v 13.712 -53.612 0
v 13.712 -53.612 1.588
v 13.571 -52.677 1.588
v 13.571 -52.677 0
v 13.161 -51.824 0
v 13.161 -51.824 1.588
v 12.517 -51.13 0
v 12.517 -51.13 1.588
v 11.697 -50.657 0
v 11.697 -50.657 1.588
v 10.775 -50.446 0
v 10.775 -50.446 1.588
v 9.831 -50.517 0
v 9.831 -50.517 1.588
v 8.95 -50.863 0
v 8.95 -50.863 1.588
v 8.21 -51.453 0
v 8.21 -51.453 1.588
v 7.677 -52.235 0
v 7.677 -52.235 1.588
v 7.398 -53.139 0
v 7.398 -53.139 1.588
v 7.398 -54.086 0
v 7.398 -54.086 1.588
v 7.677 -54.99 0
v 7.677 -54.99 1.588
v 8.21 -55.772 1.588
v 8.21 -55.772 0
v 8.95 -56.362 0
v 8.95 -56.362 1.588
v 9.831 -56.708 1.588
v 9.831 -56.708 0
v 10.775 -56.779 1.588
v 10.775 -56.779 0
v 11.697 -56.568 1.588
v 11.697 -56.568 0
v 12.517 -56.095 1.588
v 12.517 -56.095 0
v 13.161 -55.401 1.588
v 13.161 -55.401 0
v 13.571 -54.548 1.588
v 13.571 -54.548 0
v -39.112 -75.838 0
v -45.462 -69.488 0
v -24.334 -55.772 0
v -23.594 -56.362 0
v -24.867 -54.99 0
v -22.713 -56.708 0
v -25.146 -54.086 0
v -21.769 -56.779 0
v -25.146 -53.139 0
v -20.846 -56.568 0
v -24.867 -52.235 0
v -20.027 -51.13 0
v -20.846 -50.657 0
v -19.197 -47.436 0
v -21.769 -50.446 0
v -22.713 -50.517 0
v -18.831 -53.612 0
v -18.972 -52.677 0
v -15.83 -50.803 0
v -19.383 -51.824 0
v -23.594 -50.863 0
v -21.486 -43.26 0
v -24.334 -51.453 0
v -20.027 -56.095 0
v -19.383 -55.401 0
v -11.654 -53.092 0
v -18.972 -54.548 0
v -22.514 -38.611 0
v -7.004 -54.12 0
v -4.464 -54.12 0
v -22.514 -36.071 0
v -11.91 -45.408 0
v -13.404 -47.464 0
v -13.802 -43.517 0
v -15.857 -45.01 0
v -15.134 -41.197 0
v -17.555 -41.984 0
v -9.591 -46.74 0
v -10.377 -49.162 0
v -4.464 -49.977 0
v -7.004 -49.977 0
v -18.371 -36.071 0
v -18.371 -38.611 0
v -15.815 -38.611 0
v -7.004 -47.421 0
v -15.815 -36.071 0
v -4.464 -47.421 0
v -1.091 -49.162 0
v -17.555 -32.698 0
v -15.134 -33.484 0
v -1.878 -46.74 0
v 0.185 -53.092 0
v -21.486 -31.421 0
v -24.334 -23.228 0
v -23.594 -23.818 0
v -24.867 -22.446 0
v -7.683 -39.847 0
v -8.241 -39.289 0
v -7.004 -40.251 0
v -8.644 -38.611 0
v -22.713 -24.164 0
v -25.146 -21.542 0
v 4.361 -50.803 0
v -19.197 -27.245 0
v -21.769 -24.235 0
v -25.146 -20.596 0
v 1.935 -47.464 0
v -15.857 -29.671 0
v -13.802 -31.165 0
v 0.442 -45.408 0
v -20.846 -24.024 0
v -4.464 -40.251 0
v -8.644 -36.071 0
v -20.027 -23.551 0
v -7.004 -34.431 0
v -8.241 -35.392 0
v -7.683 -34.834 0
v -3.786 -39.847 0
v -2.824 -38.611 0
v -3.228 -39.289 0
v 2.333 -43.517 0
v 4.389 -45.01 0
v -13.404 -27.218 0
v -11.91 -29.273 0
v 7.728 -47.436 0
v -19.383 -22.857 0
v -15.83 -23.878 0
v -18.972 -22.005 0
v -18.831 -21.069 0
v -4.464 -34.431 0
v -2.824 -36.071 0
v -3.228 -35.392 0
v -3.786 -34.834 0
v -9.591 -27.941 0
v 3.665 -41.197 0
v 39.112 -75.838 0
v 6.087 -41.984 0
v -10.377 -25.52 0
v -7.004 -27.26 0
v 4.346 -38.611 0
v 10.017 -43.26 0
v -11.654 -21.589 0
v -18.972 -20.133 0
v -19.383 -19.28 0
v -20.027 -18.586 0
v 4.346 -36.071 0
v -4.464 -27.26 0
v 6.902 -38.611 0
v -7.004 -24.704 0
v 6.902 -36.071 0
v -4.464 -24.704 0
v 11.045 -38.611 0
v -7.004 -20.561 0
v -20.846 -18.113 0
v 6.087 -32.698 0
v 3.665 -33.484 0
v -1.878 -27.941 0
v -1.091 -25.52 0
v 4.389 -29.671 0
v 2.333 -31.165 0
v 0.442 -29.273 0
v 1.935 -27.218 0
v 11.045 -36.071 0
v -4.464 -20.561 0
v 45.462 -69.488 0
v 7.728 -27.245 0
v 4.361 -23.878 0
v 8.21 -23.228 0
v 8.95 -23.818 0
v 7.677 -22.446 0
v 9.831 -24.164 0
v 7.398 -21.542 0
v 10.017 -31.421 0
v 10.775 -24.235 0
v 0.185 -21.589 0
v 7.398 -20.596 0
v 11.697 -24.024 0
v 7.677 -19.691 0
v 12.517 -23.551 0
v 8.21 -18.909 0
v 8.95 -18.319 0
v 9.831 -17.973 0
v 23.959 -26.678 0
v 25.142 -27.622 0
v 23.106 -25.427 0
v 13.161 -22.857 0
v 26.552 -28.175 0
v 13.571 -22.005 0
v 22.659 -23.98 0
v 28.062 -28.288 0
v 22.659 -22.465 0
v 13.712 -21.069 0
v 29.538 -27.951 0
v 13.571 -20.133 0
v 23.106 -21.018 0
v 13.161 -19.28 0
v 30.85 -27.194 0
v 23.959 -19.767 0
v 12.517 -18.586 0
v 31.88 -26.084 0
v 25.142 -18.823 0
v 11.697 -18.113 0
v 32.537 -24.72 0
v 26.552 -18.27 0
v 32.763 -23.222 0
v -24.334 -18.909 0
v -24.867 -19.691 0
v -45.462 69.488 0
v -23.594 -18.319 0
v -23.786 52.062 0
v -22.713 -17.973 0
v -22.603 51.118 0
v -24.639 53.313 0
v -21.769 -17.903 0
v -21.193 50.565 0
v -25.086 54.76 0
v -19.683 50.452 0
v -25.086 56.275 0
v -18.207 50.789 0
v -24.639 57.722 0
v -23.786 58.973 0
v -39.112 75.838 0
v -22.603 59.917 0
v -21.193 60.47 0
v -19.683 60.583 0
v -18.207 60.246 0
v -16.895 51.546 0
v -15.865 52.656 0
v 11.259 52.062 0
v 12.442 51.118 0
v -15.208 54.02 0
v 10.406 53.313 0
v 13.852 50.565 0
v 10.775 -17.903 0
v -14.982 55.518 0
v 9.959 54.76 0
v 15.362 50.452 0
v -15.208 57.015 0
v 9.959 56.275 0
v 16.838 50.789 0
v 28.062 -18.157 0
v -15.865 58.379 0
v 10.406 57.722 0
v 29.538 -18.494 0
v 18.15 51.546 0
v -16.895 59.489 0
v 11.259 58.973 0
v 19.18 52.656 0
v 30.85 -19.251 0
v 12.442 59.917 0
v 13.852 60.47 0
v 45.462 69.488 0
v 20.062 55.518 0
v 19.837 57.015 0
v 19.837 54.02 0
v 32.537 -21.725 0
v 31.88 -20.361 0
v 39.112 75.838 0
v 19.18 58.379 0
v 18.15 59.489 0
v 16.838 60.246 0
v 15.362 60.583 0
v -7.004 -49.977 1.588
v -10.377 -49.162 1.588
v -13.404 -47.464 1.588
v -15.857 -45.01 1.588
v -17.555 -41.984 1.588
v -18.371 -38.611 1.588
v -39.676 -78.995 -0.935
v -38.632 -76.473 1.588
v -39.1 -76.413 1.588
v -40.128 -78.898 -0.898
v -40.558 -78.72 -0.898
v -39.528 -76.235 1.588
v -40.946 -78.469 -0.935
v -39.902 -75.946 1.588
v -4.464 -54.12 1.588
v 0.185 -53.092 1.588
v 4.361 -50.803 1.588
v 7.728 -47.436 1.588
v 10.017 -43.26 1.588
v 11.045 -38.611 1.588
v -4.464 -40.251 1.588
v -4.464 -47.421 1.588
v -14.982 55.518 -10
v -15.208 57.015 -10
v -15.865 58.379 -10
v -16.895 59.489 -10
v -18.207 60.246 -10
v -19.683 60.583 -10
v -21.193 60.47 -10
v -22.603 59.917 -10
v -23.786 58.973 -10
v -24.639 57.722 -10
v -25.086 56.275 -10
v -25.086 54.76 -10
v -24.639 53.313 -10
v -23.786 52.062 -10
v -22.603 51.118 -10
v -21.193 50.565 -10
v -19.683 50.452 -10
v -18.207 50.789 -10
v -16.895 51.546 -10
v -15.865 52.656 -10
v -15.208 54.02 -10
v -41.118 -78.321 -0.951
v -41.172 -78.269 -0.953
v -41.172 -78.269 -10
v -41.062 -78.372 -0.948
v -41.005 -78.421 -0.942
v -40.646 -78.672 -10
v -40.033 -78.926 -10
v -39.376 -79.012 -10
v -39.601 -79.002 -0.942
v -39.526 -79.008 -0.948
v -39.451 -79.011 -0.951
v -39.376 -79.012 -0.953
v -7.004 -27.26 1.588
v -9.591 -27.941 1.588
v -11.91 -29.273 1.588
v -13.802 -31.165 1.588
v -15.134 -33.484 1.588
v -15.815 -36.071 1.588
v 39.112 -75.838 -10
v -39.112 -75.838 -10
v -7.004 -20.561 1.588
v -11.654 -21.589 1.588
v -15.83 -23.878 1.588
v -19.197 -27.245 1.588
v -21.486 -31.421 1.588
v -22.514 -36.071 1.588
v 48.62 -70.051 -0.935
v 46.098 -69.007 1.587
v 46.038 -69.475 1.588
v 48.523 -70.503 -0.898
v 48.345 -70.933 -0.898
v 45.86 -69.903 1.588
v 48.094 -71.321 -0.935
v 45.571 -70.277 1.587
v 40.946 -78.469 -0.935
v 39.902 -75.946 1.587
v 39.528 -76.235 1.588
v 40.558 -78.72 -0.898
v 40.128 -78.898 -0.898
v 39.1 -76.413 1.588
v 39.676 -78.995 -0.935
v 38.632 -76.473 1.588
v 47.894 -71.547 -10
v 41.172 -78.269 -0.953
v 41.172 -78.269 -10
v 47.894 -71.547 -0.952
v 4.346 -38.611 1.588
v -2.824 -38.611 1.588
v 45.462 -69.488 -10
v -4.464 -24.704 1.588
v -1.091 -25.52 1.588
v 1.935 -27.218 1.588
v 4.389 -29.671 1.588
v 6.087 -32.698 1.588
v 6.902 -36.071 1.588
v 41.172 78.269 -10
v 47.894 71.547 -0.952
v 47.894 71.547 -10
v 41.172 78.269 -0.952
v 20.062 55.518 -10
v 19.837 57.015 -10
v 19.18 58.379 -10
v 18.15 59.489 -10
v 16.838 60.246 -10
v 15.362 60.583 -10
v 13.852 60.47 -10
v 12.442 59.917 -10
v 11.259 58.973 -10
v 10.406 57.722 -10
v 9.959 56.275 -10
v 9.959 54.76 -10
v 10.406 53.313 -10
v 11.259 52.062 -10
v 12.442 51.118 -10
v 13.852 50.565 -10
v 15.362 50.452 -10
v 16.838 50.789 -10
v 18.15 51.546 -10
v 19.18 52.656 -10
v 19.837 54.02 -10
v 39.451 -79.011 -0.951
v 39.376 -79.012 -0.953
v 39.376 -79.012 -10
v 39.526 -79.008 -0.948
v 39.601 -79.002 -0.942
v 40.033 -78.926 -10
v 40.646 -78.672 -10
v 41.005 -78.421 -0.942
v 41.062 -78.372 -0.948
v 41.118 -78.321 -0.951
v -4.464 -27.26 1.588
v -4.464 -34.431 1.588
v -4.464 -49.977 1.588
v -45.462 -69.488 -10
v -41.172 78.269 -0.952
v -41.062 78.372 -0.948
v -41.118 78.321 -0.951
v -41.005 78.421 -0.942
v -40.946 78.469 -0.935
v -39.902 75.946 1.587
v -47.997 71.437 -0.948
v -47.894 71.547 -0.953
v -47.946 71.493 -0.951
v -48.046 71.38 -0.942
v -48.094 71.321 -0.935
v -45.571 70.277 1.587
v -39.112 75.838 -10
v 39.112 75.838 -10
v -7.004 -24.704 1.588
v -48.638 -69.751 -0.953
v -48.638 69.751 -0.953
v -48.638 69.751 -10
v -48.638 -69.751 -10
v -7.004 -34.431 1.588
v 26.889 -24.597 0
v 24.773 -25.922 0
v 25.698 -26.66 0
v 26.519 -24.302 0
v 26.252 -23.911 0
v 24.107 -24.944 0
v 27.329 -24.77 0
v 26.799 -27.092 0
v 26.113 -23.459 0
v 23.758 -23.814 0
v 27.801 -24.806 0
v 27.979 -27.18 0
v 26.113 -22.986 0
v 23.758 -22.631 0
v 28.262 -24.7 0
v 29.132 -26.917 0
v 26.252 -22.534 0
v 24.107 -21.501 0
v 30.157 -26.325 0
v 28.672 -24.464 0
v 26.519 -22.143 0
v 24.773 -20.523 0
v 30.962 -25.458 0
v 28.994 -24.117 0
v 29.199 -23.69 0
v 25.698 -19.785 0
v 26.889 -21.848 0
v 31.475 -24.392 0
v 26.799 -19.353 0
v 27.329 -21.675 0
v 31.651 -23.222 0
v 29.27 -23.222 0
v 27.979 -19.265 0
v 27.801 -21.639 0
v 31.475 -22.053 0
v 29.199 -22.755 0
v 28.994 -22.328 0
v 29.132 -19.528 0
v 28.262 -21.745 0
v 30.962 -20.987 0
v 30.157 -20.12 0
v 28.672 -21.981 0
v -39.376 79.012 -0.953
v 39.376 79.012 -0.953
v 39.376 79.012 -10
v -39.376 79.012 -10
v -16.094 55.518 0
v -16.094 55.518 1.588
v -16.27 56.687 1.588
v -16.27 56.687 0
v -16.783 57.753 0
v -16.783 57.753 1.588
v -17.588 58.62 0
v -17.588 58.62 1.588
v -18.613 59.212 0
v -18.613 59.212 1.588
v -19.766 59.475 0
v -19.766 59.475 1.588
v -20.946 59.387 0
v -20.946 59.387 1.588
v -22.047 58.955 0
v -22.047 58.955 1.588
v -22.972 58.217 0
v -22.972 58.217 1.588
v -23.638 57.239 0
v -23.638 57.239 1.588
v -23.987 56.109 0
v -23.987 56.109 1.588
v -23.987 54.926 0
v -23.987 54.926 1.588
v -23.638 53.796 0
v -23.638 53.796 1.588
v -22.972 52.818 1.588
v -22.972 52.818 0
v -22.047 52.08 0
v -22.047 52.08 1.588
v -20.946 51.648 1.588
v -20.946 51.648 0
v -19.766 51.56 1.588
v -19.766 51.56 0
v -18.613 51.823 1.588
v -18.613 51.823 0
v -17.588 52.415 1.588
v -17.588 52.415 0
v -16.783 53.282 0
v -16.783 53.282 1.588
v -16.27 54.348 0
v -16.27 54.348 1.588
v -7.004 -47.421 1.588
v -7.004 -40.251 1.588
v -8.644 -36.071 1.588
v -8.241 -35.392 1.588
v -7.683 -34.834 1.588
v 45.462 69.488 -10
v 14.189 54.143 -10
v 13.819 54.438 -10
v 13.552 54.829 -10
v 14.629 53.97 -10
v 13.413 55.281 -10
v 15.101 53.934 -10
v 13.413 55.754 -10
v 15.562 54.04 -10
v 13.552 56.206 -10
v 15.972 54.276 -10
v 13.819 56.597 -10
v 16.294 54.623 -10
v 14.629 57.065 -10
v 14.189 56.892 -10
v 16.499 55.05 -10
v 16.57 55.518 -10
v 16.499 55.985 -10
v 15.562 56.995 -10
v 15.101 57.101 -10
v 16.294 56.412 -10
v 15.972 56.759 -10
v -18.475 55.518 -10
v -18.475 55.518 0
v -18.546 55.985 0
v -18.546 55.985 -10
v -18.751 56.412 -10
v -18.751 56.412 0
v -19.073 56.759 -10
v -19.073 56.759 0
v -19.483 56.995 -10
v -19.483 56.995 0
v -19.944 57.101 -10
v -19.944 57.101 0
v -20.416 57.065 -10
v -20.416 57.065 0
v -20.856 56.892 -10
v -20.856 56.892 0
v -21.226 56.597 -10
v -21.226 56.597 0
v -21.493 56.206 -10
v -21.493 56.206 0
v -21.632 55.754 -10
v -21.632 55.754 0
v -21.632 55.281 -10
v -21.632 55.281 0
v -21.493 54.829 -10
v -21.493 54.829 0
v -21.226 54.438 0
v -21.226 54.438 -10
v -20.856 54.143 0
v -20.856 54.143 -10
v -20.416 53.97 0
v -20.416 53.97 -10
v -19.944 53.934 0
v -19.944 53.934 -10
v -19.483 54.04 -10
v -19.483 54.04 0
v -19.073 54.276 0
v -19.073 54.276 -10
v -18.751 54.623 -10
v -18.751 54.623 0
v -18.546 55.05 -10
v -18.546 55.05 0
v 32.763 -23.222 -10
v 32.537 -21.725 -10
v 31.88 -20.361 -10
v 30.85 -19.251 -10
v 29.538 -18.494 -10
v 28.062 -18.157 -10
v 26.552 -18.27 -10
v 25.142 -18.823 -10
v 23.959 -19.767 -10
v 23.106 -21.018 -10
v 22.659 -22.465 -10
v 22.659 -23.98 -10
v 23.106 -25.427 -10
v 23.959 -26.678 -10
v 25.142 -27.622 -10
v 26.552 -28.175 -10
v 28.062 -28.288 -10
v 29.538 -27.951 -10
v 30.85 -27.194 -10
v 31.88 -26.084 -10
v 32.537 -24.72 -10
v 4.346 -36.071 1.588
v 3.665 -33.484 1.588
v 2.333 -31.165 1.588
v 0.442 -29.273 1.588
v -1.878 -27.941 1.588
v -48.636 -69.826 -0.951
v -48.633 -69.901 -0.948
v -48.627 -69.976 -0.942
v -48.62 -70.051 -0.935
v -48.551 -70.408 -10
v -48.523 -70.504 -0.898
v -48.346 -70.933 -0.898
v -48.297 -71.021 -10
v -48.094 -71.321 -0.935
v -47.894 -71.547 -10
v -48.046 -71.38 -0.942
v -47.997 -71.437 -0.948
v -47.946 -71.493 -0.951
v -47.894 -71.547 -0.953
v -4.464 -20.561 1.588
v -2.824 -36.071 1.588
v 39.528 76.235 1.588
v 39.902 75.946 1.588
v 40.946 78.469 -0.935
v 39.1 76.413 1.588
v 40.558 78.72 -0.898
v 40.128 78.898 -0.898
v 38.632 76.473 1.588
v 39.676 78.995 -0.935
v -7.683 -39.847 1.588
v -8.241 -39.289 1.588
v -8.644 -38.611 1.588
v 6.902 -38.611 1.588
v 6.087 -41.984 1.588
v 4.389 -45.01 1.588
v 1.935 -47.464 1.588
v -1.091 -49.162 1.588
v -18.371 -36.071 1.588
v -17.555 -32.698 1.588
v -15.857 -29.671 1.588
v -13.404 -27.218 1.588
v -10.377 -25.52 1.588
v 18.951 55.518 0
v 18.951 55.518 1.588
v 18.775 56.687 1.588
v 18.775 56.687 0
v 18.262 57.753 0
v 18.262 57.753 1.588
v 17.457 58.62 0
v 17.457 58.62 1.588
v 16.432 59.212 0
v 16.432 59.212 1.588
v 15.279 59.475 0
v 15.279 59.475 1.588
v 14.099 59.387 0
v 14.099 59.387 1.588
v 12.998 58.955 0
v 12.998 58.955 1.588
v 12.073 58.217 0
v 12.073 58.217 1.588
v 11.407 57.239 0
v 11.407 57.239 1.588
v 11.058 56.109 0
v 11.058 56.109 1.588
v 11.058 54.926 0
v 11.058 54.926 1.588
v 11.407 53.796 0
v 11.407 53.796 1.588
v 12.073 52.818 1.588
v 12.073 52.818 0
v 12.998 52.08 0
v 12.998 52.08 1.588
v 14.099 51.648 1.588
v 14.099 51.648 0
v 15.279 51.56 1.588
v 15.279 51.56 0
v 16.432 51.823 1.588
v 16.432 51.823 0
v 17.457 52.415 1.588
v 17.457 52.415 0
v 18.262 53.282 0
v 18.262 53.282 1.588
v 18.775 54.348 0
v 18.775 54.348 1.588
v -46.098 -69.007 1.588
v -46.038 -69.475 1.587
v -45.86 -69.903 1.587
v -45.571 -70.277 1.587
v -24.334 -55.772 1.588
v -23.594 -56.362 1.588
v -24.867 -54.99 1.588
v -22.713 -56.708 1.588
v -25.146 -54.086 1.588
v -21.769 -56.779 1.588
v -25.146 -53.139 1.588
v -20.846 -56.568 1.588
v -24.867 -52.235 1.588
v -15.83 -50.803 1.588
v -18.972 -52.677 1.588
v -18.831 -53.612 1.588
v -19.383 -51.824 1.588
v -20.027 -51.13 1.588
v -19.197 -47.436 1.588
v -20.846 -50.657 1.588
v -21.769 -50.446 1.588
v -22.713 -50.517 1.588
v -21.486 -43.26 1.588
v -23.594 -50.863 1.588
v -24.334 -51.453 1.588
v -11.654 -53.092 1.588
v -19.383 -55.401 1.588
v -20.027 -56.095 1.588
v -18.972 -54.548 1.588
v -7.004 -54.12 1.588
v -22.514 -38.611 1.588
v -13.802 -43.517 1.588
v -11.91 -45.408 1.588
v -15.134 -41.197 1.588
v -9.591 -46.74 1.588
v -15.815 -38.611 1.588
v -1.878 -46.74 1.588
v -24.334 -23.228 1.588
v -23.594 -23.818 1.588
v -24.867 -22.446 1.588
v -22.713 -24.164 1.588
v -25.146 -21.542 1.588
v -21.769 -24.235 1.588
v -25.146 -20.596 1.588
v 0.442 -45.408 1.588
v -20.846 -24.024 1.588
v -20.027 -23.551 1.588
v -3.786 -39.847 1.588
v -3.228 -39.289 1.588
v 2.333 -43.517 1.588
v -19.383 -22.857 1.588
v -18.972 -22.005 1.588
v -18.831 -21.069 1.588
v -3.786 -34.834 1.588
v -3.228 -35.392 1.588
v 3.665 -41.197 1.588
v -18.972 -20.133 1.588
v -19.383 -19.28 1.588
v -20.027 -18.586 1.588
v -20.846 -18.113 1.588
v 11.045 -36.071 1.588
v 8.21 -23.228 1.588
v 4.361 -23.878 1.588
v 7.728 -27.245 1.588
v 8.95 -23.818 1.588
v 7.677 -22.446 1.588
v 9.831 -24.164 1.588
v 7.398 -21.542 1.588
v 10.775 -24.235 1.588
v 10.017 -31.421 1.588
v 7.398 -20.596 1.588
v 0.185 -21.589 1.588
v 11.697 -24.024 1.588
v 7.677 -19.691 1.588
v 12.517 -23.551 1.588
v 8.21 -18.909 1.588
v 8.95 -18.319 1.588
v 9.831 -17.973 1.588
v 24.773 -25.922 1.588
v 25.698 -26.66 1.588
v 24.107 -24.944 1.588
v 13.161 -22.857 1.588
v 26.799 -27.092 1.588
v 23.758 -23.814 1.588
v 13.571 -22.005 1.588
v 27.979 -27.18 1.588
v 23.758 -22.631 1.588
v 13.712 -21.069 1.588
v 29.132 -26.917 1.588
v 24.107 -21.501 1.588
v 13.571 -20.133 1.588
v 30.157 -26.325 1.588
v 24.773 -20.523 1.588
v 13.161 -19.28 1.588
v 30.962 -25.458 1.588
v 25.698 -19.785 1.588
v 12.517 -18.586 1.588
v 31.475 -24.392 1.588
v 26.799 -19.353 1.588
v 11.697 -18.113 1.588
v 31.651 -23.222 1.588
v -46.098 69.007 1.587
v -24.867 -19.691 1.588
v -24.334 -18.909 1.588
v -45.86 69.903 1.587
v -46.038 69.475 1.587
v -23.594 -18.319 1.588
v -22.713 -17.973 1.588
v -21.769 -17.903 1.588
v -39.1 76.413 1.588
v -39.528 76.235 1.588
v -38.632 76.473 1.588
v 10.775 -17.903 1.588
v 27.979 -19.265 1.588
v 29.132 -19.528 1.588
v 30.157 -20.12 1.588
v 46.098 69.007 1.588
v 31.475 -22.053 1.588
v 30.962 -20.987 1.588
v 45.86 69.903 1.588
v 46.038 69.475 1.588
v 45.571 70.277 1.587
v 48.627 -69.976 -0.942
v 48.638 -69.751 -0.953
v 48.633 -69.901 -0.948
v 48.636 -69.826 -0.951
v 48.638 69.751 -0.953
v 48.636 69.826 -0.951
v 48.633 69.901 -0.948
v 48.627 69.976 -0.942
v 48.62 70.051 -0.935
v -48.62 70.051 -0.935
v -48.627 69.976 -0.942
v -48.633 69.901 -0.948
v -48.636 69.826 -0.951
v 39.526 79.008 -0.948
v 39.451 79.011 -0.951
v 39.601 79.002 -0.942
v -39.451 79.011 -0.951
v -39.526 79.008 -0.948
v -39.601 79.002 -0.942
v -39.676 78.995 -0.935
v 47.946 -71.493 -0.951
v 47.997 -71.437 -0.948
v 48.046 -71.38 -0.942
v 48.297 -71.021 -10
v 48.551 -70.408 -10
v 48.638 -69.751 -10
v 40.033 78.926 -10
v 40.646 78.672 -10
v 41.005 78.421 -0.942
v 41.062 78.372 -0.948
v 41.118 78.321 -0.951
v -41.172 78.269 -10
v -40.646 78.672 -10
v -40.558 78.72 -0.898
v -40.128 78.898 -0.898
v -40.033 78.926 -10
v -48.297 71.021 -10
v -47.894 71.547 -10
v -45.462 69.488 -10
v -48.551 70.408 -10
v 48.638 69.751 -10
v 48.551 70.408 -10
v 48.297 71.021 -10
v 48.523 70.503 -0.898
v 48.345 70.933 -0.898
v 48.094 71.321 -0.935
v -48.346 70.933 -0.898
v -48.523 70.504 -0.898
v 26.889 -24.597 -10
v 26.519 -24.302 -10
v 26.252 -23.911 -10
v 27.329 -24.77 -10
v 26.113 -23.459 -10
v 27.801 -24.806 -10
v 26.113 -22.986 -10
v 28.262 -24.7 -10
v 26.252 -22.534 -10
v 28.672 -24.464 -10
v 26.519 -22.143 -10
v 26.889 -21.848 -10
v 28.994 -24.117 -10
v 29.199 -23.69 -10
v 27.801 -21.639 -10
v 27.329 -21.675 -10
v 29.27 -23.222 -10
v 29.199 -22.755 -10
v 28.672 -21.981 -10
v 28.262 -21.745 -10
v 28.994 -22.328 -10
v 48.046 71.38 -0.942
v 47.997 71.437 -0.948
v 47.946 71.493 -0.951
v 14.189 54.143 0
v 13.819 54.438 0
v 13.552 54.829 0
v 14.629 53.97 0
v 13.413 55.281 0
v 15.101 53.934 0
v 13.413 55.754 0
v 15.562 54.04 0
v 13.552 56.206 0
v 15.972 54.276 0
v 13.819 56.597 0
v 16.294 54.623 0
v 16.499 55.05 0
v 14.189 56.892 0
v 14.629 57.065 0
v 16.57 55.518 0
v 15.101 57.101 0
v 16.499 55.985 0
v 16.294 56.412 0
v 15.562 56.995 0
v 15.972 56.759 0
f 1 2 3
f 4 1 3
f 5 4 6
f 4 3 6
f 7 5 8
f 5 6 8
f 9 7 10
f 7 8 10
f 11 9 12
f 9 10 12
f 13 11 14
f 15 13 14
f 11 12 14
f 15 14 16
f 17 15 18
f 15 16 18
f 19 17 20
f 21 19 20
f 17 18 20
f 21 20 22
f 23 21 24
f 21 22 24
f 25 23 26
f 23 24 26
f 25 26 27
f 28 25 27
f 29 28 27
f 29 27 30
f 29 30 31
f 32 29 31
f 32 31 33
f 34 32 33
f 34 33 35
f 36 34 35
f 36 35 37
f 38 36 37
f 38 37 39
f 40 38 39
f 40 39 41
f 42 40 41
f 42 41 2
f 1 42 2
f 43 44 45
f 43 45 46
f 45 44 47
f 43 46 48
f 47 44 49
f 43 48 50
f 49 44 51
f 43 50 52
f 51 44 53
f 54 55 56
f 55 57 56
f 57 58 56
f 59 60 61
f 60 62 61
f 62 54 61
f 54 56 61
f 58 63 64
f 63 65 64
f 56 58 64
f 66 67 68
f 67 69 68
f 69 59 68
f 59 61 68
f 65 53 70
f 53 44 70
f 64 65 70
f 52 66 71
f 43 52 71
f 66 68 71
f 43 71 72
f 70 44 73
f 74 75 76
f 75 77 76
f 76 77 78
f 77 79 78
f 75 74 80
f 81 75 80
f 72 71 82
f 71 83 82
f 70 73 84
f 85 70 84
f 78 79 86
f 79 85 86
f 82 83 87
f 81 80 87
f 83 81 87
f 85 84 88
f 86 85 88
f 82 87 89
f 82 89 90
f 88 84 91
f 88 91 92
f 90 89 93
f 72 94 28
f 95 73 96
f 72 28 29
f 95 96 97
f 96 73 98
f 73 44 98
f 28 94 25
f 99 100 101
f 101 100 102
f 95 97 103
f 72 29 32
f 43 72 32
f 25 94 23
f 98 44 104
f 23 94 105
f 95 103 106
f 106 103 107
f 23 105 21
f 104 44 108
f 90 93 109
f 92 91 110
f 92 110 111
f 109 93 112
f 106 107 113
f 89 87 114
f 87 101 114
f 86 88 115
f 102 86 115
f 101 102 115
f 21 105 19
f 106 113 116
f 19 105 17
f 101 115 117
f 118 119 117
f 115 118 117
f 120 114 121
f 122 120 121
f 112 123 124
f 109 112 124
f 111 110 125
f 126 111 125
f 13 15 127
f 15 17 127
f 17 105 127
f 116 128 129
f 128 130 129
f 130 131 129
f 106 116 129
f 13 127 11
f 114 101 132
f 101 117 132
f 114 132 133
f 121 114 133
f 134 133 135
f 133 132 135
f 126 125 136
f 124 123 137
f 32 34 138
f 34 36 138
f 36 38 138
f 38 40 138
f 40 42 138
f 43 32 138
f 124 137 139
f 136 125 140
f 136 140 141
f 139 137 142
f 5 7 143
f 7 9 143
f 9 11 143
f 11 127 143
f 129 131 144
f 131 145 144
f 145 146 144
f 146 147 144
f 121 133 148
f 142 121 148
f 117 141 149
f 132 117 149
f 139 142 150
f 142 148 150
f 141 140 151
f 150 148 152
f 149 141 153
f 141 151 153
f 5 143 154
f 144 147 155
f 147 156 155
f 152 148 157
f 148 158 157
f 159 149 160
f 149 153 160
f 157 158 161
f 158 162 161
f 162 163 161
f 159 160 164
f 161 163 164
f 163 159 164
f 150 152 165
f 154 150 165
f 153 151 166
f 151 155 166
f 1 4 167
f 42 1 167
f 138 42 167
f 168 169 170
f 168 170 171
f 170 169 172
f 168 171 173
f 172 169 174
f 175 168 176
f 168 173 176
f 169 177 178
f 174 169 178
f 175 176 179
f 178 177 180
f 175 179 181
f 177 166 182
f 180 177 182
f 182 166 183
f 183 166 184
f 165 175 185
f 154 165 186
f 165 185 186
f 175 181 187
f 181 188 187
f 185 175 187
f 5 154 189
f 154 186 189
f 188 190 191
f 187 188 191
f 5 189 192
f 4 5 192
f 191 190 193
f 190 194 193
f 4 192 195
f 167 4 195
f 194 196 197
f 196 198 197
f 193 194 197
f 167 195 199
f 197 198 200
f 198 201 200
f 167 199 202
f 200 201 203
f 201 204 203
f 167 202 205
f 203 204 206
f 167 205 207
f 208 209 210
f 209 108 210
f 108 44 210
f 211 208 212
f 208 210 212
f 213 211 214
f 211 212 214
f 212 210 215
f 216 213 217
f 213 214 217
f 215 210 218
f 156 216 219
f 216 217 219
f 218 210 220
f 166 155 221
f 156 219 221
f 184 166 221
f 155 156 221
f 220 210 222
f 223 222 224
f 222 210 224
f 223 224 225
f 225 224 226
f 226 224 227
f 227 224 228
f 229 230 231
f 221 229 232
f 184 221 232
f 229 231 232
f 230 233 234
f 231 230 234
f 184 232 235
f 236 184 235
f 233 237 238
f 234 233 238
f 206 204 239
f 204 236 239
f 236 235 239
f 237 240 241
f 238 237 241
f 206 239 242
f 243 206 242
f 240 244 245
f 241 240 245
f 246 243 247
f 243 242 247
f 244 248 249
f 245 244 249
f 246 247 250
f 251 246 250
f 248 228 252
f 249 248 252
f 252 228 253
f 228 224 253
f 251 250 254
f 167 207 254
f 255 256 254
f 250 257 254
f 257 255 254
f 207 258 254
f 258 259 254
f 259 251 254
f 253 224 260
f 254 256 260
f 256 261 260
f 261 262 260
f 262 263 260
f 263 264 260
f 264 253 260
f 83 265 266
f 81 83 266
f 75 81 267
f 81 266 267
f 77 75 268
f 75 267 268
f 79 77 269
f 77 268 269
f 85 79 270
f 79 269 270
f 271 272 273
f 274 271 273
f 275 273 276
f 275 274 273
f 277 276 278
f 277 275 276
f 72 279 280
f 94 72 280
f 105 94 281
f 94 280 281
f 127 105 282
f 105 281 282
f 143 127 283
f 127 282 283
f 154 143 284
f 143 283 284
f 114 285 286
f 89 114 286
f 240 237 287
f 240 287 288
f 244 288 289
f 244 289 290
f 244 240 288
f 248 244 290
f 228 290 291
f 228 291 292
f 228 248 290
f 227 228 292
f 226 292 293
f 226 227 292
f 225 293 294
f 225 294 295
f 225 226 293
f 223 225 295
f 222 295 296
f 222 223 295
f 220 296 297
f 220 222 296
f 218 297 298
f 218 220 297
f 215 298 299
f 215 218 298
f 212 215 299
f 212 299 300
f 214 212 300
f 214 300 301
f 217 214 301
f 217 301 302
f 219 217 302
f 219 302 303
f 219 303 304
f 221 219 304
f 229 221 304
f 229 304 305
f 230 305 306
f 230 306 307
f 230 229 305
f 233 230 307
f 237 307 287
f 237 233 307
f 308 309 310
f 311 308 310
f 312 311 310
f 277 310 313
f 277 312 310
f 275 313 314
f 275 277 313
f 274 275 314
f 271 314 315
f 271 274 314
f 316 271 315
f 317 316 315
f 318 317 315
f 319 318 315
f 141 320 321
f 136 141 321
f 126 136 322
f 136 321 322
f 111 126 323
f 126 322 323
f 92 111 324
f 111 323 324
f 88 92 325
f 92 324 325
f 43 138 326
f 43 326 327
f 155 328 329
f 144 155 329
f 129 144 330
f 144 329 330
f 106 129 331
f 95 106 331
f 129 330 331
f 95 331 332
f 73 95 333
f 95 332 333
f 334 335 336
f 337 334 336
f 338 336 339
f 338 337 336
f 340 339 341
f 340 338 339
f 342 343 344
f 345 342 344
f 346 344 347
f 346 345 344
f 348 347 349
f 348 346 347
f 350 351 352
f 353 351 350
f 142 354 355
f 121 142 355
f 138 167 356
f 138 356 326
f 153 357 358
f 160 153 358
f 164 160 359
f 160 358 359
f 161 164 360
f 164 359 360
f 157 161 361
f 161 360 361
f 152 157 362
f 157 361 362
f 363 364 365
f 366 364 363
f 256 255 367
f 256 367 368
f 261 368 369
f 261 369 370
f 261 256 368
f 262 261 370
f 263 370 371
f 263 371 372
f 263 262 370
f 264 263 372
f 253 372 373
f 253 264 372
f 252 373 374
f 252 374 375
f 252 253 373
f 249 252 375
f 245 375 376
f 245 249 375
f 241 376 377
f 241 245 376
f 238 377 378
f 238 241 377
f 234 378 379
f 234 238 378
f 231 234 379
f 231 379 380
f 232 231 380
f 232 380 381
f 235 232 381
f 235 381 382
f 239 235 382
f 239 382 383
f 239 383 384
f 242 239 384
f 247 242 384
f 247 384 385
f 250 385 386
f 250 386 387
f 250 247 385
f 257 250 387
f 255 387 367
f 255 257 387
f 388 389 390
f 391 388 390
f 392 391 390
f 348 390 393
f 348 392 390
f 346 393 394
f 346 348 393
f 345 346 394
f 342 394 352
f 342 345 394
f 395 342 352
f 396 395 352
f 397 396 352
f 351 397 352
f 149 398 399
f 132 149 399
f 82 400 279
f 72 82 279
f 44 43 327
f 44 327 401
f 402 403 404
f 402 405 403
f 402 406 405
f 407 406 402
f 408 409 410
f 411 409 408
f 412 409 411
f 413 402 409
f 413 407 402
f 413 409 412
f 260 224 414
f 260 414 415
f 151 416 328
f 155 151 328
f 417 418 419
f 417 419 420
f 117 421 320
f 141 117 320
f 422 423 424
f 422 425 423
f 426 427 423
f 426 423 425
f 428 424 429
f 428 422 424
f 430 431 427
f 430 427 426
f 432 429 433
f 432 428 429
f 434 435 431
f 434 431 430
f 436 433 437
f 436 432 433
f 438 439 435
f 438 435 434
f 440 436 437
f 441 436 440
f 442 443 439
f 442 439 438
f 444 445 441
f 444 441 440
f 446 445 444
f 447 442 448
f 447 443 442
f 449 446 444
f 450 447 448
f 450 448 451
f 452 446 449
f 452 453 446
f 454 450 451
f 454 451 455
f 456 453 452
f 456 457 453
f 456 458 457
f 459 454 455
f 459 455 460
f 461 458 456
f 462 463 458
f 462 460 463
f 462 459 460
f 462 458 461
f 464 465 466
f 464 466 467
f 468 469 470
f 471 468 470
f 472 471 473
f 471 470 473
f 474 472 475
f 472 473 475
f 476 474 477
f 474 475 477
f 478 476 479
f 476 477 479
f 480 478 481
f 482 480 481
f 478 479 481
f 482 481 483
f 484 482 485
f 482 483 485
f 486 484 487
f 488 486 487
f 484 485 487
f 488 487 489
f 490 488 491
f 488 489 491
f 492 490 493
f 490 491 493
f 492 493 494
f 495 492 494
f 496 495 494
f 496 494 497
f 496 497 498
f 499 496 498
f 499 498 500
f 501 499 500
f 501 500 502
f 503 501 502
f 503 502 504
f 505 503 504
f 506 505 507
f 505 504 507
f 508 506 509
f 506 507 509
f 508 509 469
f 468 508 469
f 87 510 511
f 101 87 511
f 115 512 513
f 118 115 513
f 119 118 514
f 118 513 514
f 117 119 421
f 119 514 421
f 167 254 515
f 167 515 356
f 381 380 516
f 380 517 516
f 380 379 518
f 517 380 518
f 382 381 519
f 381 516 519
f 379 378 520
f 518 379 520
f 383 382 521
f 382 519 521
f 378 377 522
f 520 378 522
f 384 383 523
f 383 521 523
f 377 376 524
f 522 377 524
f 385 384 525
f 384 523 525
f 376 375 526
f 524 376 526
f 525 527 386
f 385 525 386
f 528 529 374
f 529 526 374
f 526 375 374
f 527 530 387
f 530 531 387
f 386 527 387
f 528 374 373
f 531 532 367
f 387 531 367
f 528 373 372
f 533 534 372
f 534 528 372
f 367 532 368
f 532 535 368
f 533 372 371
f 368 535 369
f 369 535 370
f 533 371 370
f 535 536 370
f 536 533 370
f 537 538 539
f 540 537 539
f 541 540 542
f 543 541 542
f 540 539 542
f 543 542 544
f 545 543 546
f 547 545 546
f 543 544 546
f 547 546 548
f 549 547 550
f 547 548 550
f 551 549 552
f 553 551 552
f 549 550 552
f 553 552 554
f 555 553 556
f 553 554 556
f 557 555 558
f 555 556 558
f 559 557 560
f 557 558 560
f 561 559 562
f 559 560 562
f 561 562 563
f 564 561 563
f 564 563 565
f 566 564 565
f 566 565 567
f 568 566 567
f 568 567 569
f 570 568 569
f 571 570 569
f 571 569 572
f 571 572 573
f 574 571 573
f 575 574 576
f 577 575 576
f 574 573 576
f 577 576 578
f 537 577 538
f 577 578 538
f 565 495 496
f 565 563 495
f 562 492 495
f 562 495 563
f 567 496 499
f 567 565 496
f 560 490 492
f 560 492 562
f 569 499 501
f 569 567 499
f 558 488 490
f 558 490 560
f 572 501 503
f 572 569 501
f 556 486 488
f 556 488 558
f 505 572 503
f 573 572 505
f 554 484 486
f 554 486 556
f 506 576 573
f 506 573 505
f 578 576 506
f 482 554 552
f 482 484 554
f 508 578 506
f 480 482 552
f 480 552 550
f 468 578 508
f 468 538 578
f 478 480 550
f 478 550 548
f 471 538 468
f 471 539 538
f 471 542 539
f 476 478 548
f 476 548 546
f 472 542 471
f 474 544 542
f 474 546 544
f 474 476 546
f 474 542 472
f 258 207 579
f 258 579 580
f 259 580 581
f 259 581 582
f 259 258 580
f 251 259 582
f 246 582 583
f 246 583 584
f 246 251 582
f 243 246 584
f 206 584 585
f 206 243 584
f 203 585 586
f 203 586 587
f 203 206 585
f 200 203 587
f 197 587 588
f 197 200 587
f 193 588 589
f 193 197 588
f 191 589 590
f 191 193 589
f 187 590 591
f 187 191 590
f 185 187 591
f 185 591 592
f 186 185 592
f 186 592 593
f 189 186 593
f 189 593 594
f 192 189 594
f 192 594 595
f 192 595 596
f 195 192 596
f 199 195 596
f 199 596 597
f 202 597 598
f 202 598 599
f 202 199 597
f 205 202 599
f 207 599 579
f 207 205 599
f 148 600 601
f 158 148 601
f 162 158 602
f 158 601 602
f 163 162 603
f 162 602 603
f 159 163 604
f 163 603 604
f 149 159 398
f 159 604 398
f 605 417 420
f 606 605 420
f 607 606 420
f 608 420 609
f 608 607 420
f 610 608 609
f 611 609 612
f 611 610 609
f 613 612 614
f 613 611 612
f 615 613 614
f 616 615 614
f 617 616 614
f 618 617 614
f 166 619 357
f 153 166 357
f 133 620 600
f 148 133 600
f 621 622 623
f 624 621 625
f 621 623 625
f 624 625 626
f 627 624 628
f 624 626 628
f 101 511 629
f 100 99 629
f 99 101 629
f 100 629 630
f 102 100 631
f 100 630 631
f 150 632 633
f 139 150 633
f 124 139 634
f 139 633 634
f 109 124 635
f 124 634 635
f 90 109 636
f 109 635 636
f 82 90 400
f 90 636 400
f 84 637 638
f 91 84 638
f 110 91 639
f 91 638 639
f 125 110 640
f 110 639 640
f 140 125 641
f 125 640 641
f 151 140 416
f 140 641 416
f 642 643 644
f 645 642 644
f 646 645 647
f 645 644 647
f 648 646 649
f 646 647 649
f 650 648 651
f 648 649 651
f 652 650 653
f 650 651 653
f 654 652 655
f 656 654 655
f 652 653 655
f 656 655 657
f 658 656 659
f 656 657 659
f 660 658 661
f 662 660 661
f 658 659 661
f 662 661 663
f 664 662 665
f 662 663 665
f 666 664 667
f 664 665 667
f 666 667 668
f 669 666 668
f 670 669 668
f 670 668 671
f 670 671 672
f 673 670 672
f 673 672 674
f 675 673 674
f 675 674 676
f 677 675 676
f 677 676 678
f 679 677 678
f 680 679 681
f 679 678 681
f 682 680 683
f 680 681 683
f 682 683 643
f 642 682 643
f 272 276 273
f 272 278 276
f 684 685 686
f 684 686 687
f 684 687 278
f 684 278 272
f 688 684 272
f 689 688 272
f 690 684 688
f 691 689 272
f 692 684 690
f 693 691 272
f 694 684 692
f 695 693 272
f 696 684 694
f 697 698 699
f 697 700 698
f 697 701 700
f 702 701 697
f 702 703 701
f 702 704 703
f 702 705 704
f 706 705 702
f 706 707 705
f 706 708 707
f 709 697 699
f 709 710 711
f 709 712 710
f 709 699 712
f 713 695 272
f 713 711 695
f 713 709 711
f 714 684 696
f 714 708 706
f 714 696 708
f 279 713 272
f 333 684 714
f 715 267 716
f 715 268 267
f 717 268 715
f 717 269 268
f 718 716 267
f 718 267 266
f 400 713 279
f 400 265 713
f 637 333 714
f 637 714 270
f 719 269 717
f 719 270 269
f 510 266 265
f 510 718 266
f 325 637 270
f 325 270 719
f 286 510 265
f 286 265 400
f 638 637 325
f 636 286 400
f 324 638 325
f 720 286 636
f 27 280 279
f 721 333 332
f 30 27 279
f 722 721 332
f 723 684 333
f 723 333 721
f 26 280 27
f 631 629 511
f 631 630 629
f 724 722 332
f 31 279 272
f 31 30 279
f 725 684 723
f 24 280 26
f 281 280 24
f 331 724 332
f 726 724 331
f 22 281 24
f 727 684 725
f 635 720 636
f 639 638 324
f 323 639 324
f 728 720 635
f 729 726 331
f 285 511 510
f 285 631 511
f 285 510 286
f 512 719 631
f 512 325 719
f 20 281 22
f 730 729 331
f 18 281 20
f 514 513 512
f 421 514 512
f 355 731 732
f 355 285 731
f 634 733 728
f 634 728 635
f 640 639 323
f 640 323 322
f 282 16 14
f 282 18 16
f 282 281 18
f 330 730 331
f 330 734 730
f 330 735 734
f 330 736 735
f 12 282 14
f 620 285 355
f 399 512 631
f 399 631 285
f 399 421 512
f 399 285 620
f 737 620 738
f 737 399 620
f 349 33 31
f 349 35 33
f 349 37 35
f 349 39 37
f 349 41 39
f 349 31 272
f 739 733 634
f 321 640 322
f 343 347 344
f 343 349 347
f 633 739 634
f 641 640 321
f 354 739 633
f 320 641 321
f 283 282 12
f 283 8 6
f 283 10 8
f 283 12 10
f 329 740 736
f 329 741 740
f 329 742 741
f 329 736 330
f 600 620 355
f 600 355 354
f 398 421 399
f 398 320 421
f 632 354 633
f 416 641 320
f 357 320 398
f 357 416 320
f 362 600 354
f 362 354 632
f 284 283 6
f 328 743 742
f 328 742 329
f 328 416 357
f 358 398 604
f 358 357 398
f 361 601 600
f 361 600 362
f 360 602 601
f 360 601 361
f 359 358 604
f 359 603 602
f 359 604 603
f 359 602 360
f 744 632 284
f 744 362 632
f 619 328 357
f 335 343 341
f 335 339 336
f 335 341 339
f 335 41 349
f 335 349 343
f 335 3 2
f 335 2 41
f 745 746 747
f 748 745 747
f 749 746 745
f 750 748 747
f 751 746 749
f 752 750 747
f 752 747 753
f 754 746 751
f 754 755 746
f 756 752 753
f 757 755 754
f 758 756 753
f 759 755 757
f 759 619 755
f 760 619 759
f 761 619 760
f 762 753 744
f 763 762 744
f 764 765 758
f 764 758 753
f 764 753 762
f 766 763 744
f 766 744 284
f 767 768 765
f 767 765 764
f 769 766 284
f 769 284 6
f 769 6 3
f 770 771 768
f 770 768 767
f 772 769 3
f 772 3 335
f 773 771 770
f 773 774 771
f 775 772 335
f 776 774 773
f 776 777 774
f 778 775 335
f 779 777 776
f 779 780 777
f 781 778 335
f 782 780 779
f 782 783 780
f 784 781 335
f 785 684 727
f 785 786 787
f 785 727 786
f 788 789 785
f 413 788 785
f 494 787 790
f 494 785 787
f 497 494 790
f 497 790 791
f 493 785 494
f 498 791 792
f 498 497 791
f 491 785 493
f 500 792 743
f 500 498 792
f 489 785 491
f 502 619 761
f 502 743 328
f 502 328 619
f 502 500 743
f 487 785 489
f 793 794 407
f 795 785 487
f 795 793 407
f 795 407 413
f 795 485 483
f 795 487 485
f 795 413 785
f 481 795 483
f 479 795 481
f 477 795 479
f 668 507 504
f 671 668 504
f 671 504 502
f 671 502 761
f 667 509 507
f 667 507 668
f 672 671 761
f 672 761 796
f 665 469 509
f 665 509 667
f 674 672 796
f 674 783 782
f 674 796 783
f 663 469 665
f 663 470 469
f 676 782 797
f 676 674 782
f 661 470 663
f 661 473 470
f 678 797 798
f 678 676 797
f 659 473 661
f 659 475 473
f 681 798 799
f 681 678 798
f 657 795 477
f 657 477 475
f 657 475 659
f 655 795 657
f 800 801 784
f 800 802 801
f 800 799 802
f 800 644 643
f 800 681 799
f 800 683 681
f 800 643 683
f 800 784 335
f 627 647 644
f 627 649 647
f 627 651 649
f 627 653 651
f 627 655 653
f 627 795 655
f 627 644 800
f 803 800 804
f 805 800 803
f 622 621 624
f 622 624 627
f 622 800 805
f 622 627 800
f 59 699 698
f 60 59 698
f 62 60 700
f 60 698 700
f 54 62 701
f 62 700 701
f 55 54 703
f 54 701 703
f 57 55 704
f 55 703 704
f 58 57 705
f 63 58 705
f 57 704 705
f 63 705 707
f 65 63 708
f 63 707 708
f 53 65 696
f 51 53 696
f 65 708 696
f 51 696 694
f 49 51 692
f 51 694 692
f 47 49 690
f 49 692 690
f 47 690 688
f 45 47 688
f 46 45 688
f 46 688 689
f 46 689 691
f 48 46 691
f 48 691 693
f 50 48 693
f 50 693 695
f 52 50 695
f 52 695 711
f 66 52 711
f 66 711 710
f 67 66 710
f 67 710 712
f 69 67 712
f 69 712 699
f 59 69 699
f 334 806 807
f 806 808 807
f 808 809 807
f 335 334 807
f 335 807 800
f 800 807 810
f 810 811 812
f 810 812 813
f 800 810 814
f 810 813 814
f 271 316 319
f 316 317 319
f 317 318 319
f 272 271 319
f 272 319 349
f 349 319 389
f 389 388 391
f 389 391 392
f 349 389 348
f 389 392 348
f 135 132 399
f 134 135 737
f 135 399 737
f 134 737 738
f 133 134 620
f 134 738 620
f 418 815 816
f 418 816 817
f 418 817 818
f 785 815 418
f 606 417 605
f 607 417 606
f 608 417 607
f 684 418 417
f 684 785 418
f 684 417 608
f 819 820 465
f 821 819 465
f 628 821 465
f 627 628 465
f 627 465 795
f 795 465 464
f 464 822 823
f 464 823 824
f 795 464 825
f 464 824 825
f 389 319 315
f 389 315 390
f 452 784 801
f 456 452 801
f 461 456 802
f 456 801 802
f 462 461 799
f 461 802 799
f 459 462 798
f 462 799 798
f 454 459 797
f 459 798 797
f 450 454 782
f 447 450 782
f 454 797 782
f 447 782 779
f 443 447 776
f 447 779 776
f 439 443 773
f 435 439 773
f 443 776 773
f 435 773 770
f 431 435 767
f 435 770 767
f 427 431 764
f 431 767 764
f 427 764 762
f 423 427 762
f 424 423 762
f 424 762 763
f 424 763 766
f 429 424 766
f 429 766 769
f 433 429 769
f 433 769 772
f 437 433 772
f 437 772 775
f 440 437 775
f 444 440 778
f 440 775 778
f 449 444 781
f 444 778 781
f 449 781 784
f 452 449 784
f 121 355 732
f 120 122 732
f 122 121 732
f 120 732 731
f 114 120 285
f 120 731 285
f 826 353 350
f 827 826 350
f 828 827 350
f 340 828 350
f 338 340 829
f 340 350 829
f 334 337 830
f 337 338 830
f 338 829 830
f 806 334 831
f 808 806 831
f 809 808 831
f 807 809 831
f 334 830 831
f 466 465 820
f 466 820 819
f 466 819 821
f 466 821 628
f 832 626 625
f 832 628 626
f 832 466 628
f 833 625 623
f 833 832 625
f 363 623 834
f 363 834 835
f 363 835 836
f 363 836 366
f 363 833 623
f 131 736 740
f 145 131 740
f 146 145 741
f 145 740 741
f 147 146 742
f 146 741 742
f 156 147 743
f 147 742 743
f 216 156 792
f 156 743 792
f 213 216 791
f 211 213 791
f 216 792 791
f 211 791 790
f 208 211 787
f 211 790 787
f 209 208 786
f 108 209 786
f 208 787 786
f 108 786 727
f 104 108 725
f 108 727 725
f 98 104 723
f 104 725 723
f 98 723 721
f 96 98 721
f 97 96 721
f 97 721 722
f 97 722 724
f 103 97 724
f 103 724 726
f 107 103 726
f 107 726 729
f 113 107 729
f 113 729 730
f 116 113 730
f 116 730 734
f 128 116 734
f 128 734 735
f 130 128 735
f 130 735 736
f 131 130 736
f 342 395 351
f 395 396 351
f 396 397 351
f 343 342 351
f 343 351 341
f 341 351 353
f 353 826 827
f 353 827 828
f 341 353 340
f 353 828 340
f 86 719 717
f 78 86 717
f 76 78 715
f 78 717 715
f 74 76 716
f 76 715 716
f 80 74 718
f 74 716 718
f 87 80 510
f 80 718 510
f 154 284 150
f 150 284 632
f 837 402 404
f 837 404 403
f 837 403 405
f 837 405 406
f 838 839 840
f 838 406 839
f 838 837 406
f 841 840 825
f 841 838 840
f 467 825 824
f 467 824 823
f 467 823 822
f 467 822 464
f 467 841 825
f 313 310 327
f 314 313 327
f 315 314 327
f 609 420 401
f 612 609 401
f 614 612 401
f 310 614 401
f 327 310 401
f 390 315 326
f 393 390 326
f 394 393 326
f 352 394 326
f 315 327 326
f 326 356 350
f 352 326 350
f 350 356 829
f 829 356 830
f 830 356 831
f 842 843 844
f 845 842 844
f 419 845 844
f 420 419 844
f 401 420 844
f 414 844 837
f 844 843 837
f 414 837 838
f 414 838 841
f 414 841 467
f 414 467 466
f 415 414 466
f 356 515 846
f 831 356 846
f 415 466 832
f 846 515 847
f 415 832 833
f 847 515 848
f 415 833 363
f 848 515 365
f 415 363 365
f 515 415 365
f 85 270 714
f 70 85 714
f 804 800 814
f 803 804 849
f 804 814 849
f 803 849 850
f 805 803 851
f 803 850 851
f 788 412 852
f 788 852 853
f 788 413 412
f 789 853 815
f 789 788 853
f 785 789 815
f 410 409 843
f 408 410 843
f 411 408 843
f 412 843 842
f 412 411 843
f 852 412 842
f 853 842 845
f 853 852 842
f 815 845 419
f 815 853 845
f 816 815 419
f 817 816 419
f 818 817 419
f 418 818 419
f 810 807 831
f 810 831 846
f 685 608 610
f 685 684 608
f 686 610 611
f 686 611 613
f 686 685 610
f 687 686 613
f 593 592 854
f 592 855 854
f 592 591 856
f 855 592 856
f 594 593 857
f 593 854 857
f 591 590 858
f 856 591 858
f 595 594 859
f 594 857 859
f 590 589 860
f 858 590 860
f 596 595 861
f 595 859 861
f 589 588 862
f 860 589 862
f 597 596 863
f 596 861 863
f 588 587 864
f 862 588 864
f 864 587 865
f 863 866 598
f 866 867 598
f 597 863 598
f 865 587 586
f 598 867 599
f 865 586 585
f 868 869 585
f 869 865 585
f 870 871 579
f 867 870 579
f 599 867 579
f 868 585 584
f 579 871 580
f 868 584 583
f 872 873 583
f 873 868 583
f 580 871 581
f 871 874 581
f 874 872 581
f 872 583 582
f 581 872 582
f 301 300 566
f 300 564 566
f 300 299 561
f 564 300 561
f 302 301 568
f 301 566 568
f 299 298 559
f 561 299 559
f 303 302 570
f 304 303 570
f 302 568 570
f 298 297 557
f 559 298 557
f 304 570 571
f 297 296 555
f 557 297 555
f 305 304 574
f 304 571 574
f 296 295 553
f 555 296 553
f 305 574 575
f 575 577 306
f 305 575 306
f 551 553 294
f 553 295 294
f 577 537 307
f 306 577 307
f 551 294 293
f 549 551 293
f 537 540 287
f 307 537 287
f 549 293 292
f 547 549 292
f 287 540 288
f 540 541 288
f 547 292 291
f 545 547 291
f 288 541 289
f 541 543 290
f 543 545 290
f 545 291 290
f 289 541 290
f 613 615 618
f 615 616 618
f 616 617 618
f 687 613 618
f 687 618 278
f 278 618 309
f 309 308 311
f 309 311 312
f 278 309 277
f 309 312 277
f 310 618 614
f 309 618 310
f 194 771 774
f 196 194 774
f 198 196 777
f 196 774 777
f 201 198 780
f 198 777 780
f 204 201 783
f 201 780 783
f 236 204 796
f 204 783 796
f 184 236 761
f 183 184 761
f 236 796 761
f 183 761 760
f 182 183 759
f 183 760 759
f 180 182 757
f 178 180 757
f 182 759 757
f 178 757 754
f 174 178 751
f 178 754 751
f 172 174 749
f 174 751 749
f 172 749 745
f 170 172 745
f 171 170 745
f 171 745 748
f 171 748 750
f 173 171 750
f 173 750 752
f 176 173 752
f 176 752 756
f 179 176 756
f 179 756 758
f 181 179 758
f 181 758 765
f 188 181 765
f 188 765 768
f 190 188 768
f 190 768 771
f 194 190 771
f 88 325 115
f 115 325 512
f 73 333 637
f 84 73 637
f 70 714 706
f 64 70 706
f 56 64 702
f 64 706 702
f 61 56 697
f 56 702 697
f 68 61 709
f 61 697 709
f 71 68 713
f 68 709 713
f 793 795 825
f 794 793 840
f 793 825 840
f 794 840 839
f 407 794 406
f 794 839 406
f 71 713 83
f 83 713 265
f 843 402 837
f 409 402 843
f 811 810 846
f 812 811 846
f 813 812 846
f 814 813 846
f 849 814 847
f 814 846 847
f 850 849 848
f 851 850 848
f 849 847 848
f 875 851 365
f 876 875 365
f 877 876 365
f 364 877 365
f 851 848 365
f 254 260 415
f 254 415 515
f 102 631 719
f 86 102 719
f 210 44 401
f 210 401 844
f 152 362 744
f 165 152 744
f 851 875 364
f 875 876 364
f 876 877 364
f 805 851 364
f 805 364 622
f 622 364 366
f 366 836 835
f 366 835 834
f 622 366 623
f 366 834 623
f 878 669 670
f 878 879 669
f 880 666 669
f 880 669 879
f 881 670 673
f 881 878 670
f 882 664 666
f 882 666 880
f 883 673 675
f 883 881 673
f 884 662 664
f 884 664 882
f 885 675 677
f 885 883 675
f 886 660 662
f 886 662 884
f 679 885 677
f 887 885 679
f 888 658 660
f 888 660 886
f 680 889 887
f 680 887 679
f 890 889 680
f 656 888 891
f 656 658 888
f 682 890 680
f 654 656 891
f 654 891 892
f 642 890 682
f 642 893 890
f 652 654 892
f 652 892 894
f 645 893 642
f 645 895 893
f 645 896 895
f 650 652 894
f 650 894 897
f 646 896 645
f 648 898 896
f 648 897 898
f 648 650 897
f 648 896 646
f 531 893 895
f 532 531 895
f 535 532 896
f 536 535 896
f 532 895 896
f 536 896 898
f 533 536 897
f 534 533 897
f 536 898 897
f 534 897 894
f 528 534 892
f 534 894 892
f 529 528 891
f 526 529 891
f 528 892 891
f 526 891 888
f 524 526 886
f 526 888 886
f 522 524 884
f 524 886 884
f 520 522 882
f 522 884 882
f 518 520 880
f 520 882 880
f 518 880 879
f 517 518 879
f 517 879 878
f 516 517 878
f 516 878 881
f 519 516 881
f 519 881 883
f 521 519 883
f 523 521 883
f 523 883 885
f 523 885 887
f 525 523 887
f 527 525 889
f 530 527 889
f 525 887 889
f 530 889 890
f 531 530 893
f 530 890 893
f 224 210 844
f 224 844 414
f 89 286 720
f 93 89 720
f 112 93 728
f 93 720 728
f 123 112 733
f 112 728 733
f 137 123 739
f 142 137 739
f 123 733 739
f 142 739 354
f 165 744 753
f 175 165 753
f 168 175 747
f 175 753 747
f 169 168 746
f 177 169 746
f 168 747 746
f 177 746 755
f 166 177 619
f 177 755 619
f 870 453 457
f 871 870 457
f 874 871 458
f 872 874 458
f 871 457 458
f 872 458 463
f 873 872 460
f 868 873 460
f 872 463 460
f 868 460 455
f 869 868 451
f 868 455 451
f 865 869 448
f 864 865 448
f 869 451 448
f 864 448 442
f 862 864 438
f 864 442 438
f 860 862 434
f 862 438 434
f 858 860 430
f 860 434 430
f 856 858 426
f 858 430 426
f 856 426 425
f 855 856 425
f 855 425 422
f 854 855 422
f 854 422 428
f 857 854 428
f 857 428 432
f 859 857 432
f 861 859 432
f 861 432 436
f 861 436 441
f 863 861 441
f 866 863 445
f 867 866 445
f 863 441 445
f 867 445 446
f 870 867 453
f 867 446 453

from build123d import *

# Parameters (mm, degrees)
F3_DEPTH  = 1.5875
F1_R      = 5.08
F1_R_2    = 1.5875
F4_DEPTH  = 10
F5_DEPTH  = 10
F6_R      = 3.96875
F7_DEPTH  = 1.5875
F8_R      = 3.175
F9_DEPTH  = 11.5885
F10_SIZE  = 2.54
F11_F1_R  = 2.54
F11_F2_R  = 2.54
F11_F3_R  = 2.54
F11_F4_R  = 2.54
F11_F5_R  = 2.54
F11_F6_R  = 2.54
F11_F7_R  = 2.54
F11_F8_R  = 2.54
F11_F9_R  = 2.54
F11_F10_R = 2.54
F11_F11_R = 2.54
F11_F12_R = 2.54
F11_F13_R = 2.54
F11_F14_R = 2.54
F11_F15_R = 2.54
F11_F16_R = 2.54


with BuildPart() as f3:
    # F0 (on Top) → F3 (new body)
    with BuildSketch(Plane.XY):
        Polygon((-40.4276280605, 79.0125), (-48.6375, 70.8026280605), (-48.6375, -70.8026280605), (-40.4276280605, -79.0125), (40.4276280605, -79.0125), (48.6375, -70.8026280605), (48.6375, 70.8026280605), (40.4276280605, 79.0125), align=None)
        Polygon((-45.4625, 69.4875), (-39.1125, 75.8375), (39.1125, 75.8375), (45.4625, 69.4875), (45.4625, -69.4875), (39.1125, -75.8375), (-39.1125, -75.8375), (-45.4625, -69.4875), align=None, mode=Mode.SUBTRACT)
        Polygon((39.1125, 75.8375), (-39.1125, 75.8375), (-45.4625, 69.4875), (-45.4625, -69.4875), (-39.1125, -75.8375), (39.1125, -75.8375), (45.4625, -69.4875), (45.4625, 69.4875), align=None)
    extrude(amount=F3_DEPTH)

    # F1 (on Top) → F4 (join)
    with BuildSketch(Plane.XY):
        with Locations((27.6825, -23.2224922)):
            Circle(F1_R)
        with Locations((27.6825, -23.2224922)):
            Circle(F1_R_2, mode=Mode.SUBTRACT)
        with Locations((14.9825, 55.5175)):
            Circle(F1_R)
        with Locations((14.9825, 55.5175)):
            Circle(F1_R_2, mode=Mode.SUBTRACT)
        with Locations((-20.0625, 55.5175)):
            Circle(F1_R)
        with Locations((-20.0625, 55.5175)):
            Circle(F1_R_2, mode=Mode.SUBTRACT)
    extrude(amount=-F4_DEPTH)

    # F0 (on Top) → F5 (join)
    with BuildSketch(Plane.XY):
        Polygon((-40.4276280605, 79.0125), (-48.6375, 70.8026280605), (-48.6375, -70.8026280605), (-40.4276280605, -79.0125), (40.4276280605, -79.0125), (48.6375, -70.8026280605), (48.6375, 70.8026280605), (40.4276280605, 79.0125), align=None)
        Polygon((-45.4625, 69.4875), (-39.1125, 75.8375), (39.1125, 75.8375), (45.4625, 69.4875), (45.4625, -69.4875), (39.1125, -75.8375), (-39.1125, -75.8375), (-45.4625, -69.4875), align=None, mode=Mode.SUBTRACT)
    extrude(amount=-F5_DEPTH)

    # F6 (on face) → F7 (cut)
    with BuildSketch(Plane.XY.offset(1.5875)):
        with Locations((-20.0625, 55.5175)):
            Circle(F6_R)
        with Locations((14.9825, 55.5175)):
            Circle(F6_R)
        with Locations((27.6825, -23.2224922)):
            Circle(F6_R)
    extrude(amount=-F7_DEPTH, mode=Mode.SUBTRACT)

    # F8 (on face) → F9 (cut, through all)
    with BuildSketch(Plane.XY.offset(1.5875)):
        with Locations((-22.00625, -21.06875)):
            Circle(F8_R)
        with Locations((10.5375, -21.06875)):
            Circle(F8_R)
        with Locations((10.5375, -53.6125)):
            Circle(F8_R)
        with Locations((-22.00625, -53.6125)):
            Circle(F8_R)
        with BuildLine():
            Line((-18.3707154513, -38.610625), (-22.5138820324, -38.610625))
            ThreePointArc((-22.5138820324, -38.610625), (-17.6332143604, -49.2394643604), (-7.004375, -54.1201320324))
            Line((-7.004375, -54.1201320324), (-7.004375, -49.9769654513))
            ThreePointArc((-7.004375, -49.9769654513), (-14.7146311211, -46.3208811211), (-18.3707154513, -38.610625))
        make_face()
        with BuildLine():
            ThreePointArc((-8.6443105663, -36.070625), (-7.9794390303, -35.0955609697), (-7.004375, -34.4306894337))
            Line((-7.004375, -34.4306894337), (-7.004375, -27.2603125048))
            ThreePointArc((-7.004375, -27.2603125048), (-12.9185798969, -30.1564201031), (-15.8146874952, -36.070625))
            Line((-15.8146874952, -36.070625), (-8.6443105663, -36.070625))
        make_face()
        with BuildLine():
            Line((-4.464375, -27.2603125048), (-4.464375, -34.4306894337))
            ThreePointArc((-4.464375, -34.4306894337), (-3.4893109697, -35.0955609697), (-2.8244394337, -36.070625))
            Line((-2.8244394337, -36.070625), (4.3459374952, -36.070625))
            ThreePointArc((4.3459374952, -36.070625), (1.4498298969, -30.1564201031), (-4.464375, -27.2603125048))
        make_face()
        with BuildLine():
            Line((4.3459374952, -38.610625), (-2.8244394337, -38.610625))
            ThreePointArc((-2.8244394337, -38.610625), (-3.4893109697, -39.5856890303), (-4.464375, -40.2505605663))
            Line((-4.464375, -40.2505605663), (-4.464375, -47.4209374952))
            ThreePointArc((-4.464375, -47.4209374952), (1.4498298969, -44.5248298969), (4.3459374952, -38.610625))
        make_face()
        with BuildLine():
            Line((-7.004375, -47.4209374952), (-7.004375, -40.2505605663))
            ThreePointArc((-7.004375, -40.2505605663), (-7.9794390303, -39.5856890303), (-8.6443105663, -38.610625))
            Line((-8.6443105663, -38.610625), (-15.8146874952, -38.610625))
            ThreePointArc((-15.8146874952, -38.610625), (-12.9185798969, -44.5248298969), (-7.004375, -47.4209374952))
        make_face()
        with BuildLine():
            Line((-22.5138820324, -36.070625), (-18.3707154513, -36.070625))
            ThreePointArc((-18.3707154513, -36.070625), (-14.7146311211, -28.3603688789), (-7.004375, -24.7042845487))
            Line((-7.004375, -24.7042845487), (-7.004375, -20.5611179676))
            ThreePointArc((-7.004375, -20.5611179676), (-17.6332143604, -25.4417856396), (-22.5138820324, -36.070625))
        make_face()
        with BuildLine():
            ThreePointArc((-4.464375, -24.7042845487), (3.2458811211, -28.3603688789), (6.9019654513, -36.070625))
            Line((6.9019654513, -36.070625), (11.0451320324, -36.070625))
            ThreePointArc((11.0451320324, -36.070625), (6.1644643604, -25.4417856396), (-4.464375, -20.5611179676))
            Line((-4.464375, -20.5611179676), (-4.464375, -24.7042845487))
        make_face()
        with BuildLine():
            Line((11.0451320324, -38.610625), (6.9019654513, -38.610625))
            ThreePointArc((6.9019654513, -38.610625), (3.2458811211, -46.3208811211), (-4.464375, -49.9769654513))
            Line((-4.464375, -49.9769654513), (-4.464375, -54.1201320324))
            ThreePointArc((-4.464375, -54.1201320324), (6.1644643604, -49.2394643604), (11.0451320324, -38.610625))
        make_face()
    extrude(amount=-F9_DEPTH, mode=Mode.SUBTRACT)

    # F10
    f10_edges = [f3.edges().sort_by_distance(p)[0] for p in [
        (0, 79.0125, 1.5875),
        (-44.532564, 74.907564, 1.5875),
        (-48.6375, 0, 1.5875),
        (44.532564, 74.907564, 1.5875),
        (48.6375, 0, 1.5875),
        (-44.532564, -74.907564, 1.5875),
        (0, -79.0125, 1.5875),
        (44.532564, -74.907564, 1.5875),
    ]]
    chamfer(f10_edges, length=F10_SIZE)

    # F11: fillet of radius 2.54 on 16 edges, made by hand

    # F11_f1
    f11_f1_edges = [f3.edges().sort_by_distance(p)[0] for p in [
        (-40.4276280605, 79.0125, -5.47625),
    ]]
    fillet(f11_f1_edges, radius=F11_F1_R)

    # F11_f2
    f11_f2_edges = [f3.edges().sort_by_distance(p)[0] for p in [
        (-48.6375, 70.8026280605, -5.47625),
    ]]
    fillet(f11_f2_edges, radius=F11_F2_R)

    # F11_f3
    f11_f3_edges = [f3.edges().sort_by_distance(p)[0] for p in [
        (40.4276280605, 79.0125, -5.47625),
    ]]
    fillet(f11_f3_edges, radius=F11_F3_R)

    # F11_f4
    f11_f4_edges = [f3.edges().sort_by_distance(p)[0] for p in [
        (-39.8615335712, 77.6458270063, 0.4141729937),
    ]]
    fillet(f11_f4_edges, radius=F11_F4_R)

    # F11_f5
    f11_f5_edges = [f3.edges().sort_by_distance(p)[0] for p in [
        (-47.2708270063, 70.2365335712, 0.4141729937),
    ]]
    fillet(f11_f5_edges, radius=F11_F5_R)

    # F11_f6
    f11_f6_edges = [f3.edges().sort_by_distance(p)[0] for p in [
        (-48.6375, -70.8026280605, -5.47625),
    ]]
    fillet(f11_f6_edges, radius=F11_F6_R)

    # F11_f7
    f11_f7_edges = [f3.edges().sort_by_distance(p)[0] for p in [
        (48.6375, 70.8026280605, -5.47625),
    ]]
    fillet(f11_f7_edges, radius=F11_F7_R)

    # F11_f8
    f11_f8_edges = [f3.edges().sort_by_distance(p)[0] for p in [
        (39.8615335712, 77.6458270063, 0.4141729937),
    ]]
    fillet(f11_f8_edges, radius=F11_F8_R)

    # F11_f9
    f11_f9_edges = [f3.edges().sort_by_distance(p)[0] for p in [
        (-47.2708270063, -70.2365335712, 0.4141729937),
    ]]
    fillet(f11_f9_edges, radius=F11_F9_R)

    # F11_f10
    f11_f10_edges = [f3.edges().sort_by_distance(p)[0] for p in [
        (-40.4276280605, -79.0125, -5.47625),
    ]]
    fillet(f11_f10_edges, radius=F11_F10_R)

    # F11_f11
    f11_f11_edges = [f3.edges().sort_by_distance(p)[0] for p in [
        (40.4276280605, -79.0125, -5.47625),
    ]]
    fillet(f11_f11_edges, radius=F11_F11_R)

    # F11_f12
    f11_f12_edges = [f3.edges().sort_by_distance(p)[0] for p in [
        (48.6375, -70.8026280605, -5.47625),
    ]]
    fillet(f11_f12_edges, radius=F11_F12_R)

    # F11_f13
    f11_f13_edges = [f3.edges().sort_by_distance(p)[0] for p in [
        (47.2708270063, 70.2365335712, 0.4141729937),
    ]]
    fillet(f11_f13_edges, radius=F11_F13_R)

    # F11_f14
    f11_f14_edges = [f3.edges().sort_by_distance(p)[0] for p in [
        (47.2708270063, -70.2365335712, 0.4141729937),
    ]]
    fillet(f11_f14_edges, radius=F11_F14_R)

    # F11_f15
    f11_f15_edges = [f3.edges().sort_by_distance(p)[0] for p in [
        (39.8615335712, -77.6458270063, 0.4141729937),
    ]]
    fillet(f11_f15_edges, radius=F11_F15_R)

    # F11_f16
    f11_f16_edges = [f3.edges().sort_by_distance(p)[0] for p in [
        (-39.8615335712, -77.6458270063, 0.4141729937),
    ]]
    fillet(f11_f16_edges, radius=F11_F16_R)


solid = f3.part
